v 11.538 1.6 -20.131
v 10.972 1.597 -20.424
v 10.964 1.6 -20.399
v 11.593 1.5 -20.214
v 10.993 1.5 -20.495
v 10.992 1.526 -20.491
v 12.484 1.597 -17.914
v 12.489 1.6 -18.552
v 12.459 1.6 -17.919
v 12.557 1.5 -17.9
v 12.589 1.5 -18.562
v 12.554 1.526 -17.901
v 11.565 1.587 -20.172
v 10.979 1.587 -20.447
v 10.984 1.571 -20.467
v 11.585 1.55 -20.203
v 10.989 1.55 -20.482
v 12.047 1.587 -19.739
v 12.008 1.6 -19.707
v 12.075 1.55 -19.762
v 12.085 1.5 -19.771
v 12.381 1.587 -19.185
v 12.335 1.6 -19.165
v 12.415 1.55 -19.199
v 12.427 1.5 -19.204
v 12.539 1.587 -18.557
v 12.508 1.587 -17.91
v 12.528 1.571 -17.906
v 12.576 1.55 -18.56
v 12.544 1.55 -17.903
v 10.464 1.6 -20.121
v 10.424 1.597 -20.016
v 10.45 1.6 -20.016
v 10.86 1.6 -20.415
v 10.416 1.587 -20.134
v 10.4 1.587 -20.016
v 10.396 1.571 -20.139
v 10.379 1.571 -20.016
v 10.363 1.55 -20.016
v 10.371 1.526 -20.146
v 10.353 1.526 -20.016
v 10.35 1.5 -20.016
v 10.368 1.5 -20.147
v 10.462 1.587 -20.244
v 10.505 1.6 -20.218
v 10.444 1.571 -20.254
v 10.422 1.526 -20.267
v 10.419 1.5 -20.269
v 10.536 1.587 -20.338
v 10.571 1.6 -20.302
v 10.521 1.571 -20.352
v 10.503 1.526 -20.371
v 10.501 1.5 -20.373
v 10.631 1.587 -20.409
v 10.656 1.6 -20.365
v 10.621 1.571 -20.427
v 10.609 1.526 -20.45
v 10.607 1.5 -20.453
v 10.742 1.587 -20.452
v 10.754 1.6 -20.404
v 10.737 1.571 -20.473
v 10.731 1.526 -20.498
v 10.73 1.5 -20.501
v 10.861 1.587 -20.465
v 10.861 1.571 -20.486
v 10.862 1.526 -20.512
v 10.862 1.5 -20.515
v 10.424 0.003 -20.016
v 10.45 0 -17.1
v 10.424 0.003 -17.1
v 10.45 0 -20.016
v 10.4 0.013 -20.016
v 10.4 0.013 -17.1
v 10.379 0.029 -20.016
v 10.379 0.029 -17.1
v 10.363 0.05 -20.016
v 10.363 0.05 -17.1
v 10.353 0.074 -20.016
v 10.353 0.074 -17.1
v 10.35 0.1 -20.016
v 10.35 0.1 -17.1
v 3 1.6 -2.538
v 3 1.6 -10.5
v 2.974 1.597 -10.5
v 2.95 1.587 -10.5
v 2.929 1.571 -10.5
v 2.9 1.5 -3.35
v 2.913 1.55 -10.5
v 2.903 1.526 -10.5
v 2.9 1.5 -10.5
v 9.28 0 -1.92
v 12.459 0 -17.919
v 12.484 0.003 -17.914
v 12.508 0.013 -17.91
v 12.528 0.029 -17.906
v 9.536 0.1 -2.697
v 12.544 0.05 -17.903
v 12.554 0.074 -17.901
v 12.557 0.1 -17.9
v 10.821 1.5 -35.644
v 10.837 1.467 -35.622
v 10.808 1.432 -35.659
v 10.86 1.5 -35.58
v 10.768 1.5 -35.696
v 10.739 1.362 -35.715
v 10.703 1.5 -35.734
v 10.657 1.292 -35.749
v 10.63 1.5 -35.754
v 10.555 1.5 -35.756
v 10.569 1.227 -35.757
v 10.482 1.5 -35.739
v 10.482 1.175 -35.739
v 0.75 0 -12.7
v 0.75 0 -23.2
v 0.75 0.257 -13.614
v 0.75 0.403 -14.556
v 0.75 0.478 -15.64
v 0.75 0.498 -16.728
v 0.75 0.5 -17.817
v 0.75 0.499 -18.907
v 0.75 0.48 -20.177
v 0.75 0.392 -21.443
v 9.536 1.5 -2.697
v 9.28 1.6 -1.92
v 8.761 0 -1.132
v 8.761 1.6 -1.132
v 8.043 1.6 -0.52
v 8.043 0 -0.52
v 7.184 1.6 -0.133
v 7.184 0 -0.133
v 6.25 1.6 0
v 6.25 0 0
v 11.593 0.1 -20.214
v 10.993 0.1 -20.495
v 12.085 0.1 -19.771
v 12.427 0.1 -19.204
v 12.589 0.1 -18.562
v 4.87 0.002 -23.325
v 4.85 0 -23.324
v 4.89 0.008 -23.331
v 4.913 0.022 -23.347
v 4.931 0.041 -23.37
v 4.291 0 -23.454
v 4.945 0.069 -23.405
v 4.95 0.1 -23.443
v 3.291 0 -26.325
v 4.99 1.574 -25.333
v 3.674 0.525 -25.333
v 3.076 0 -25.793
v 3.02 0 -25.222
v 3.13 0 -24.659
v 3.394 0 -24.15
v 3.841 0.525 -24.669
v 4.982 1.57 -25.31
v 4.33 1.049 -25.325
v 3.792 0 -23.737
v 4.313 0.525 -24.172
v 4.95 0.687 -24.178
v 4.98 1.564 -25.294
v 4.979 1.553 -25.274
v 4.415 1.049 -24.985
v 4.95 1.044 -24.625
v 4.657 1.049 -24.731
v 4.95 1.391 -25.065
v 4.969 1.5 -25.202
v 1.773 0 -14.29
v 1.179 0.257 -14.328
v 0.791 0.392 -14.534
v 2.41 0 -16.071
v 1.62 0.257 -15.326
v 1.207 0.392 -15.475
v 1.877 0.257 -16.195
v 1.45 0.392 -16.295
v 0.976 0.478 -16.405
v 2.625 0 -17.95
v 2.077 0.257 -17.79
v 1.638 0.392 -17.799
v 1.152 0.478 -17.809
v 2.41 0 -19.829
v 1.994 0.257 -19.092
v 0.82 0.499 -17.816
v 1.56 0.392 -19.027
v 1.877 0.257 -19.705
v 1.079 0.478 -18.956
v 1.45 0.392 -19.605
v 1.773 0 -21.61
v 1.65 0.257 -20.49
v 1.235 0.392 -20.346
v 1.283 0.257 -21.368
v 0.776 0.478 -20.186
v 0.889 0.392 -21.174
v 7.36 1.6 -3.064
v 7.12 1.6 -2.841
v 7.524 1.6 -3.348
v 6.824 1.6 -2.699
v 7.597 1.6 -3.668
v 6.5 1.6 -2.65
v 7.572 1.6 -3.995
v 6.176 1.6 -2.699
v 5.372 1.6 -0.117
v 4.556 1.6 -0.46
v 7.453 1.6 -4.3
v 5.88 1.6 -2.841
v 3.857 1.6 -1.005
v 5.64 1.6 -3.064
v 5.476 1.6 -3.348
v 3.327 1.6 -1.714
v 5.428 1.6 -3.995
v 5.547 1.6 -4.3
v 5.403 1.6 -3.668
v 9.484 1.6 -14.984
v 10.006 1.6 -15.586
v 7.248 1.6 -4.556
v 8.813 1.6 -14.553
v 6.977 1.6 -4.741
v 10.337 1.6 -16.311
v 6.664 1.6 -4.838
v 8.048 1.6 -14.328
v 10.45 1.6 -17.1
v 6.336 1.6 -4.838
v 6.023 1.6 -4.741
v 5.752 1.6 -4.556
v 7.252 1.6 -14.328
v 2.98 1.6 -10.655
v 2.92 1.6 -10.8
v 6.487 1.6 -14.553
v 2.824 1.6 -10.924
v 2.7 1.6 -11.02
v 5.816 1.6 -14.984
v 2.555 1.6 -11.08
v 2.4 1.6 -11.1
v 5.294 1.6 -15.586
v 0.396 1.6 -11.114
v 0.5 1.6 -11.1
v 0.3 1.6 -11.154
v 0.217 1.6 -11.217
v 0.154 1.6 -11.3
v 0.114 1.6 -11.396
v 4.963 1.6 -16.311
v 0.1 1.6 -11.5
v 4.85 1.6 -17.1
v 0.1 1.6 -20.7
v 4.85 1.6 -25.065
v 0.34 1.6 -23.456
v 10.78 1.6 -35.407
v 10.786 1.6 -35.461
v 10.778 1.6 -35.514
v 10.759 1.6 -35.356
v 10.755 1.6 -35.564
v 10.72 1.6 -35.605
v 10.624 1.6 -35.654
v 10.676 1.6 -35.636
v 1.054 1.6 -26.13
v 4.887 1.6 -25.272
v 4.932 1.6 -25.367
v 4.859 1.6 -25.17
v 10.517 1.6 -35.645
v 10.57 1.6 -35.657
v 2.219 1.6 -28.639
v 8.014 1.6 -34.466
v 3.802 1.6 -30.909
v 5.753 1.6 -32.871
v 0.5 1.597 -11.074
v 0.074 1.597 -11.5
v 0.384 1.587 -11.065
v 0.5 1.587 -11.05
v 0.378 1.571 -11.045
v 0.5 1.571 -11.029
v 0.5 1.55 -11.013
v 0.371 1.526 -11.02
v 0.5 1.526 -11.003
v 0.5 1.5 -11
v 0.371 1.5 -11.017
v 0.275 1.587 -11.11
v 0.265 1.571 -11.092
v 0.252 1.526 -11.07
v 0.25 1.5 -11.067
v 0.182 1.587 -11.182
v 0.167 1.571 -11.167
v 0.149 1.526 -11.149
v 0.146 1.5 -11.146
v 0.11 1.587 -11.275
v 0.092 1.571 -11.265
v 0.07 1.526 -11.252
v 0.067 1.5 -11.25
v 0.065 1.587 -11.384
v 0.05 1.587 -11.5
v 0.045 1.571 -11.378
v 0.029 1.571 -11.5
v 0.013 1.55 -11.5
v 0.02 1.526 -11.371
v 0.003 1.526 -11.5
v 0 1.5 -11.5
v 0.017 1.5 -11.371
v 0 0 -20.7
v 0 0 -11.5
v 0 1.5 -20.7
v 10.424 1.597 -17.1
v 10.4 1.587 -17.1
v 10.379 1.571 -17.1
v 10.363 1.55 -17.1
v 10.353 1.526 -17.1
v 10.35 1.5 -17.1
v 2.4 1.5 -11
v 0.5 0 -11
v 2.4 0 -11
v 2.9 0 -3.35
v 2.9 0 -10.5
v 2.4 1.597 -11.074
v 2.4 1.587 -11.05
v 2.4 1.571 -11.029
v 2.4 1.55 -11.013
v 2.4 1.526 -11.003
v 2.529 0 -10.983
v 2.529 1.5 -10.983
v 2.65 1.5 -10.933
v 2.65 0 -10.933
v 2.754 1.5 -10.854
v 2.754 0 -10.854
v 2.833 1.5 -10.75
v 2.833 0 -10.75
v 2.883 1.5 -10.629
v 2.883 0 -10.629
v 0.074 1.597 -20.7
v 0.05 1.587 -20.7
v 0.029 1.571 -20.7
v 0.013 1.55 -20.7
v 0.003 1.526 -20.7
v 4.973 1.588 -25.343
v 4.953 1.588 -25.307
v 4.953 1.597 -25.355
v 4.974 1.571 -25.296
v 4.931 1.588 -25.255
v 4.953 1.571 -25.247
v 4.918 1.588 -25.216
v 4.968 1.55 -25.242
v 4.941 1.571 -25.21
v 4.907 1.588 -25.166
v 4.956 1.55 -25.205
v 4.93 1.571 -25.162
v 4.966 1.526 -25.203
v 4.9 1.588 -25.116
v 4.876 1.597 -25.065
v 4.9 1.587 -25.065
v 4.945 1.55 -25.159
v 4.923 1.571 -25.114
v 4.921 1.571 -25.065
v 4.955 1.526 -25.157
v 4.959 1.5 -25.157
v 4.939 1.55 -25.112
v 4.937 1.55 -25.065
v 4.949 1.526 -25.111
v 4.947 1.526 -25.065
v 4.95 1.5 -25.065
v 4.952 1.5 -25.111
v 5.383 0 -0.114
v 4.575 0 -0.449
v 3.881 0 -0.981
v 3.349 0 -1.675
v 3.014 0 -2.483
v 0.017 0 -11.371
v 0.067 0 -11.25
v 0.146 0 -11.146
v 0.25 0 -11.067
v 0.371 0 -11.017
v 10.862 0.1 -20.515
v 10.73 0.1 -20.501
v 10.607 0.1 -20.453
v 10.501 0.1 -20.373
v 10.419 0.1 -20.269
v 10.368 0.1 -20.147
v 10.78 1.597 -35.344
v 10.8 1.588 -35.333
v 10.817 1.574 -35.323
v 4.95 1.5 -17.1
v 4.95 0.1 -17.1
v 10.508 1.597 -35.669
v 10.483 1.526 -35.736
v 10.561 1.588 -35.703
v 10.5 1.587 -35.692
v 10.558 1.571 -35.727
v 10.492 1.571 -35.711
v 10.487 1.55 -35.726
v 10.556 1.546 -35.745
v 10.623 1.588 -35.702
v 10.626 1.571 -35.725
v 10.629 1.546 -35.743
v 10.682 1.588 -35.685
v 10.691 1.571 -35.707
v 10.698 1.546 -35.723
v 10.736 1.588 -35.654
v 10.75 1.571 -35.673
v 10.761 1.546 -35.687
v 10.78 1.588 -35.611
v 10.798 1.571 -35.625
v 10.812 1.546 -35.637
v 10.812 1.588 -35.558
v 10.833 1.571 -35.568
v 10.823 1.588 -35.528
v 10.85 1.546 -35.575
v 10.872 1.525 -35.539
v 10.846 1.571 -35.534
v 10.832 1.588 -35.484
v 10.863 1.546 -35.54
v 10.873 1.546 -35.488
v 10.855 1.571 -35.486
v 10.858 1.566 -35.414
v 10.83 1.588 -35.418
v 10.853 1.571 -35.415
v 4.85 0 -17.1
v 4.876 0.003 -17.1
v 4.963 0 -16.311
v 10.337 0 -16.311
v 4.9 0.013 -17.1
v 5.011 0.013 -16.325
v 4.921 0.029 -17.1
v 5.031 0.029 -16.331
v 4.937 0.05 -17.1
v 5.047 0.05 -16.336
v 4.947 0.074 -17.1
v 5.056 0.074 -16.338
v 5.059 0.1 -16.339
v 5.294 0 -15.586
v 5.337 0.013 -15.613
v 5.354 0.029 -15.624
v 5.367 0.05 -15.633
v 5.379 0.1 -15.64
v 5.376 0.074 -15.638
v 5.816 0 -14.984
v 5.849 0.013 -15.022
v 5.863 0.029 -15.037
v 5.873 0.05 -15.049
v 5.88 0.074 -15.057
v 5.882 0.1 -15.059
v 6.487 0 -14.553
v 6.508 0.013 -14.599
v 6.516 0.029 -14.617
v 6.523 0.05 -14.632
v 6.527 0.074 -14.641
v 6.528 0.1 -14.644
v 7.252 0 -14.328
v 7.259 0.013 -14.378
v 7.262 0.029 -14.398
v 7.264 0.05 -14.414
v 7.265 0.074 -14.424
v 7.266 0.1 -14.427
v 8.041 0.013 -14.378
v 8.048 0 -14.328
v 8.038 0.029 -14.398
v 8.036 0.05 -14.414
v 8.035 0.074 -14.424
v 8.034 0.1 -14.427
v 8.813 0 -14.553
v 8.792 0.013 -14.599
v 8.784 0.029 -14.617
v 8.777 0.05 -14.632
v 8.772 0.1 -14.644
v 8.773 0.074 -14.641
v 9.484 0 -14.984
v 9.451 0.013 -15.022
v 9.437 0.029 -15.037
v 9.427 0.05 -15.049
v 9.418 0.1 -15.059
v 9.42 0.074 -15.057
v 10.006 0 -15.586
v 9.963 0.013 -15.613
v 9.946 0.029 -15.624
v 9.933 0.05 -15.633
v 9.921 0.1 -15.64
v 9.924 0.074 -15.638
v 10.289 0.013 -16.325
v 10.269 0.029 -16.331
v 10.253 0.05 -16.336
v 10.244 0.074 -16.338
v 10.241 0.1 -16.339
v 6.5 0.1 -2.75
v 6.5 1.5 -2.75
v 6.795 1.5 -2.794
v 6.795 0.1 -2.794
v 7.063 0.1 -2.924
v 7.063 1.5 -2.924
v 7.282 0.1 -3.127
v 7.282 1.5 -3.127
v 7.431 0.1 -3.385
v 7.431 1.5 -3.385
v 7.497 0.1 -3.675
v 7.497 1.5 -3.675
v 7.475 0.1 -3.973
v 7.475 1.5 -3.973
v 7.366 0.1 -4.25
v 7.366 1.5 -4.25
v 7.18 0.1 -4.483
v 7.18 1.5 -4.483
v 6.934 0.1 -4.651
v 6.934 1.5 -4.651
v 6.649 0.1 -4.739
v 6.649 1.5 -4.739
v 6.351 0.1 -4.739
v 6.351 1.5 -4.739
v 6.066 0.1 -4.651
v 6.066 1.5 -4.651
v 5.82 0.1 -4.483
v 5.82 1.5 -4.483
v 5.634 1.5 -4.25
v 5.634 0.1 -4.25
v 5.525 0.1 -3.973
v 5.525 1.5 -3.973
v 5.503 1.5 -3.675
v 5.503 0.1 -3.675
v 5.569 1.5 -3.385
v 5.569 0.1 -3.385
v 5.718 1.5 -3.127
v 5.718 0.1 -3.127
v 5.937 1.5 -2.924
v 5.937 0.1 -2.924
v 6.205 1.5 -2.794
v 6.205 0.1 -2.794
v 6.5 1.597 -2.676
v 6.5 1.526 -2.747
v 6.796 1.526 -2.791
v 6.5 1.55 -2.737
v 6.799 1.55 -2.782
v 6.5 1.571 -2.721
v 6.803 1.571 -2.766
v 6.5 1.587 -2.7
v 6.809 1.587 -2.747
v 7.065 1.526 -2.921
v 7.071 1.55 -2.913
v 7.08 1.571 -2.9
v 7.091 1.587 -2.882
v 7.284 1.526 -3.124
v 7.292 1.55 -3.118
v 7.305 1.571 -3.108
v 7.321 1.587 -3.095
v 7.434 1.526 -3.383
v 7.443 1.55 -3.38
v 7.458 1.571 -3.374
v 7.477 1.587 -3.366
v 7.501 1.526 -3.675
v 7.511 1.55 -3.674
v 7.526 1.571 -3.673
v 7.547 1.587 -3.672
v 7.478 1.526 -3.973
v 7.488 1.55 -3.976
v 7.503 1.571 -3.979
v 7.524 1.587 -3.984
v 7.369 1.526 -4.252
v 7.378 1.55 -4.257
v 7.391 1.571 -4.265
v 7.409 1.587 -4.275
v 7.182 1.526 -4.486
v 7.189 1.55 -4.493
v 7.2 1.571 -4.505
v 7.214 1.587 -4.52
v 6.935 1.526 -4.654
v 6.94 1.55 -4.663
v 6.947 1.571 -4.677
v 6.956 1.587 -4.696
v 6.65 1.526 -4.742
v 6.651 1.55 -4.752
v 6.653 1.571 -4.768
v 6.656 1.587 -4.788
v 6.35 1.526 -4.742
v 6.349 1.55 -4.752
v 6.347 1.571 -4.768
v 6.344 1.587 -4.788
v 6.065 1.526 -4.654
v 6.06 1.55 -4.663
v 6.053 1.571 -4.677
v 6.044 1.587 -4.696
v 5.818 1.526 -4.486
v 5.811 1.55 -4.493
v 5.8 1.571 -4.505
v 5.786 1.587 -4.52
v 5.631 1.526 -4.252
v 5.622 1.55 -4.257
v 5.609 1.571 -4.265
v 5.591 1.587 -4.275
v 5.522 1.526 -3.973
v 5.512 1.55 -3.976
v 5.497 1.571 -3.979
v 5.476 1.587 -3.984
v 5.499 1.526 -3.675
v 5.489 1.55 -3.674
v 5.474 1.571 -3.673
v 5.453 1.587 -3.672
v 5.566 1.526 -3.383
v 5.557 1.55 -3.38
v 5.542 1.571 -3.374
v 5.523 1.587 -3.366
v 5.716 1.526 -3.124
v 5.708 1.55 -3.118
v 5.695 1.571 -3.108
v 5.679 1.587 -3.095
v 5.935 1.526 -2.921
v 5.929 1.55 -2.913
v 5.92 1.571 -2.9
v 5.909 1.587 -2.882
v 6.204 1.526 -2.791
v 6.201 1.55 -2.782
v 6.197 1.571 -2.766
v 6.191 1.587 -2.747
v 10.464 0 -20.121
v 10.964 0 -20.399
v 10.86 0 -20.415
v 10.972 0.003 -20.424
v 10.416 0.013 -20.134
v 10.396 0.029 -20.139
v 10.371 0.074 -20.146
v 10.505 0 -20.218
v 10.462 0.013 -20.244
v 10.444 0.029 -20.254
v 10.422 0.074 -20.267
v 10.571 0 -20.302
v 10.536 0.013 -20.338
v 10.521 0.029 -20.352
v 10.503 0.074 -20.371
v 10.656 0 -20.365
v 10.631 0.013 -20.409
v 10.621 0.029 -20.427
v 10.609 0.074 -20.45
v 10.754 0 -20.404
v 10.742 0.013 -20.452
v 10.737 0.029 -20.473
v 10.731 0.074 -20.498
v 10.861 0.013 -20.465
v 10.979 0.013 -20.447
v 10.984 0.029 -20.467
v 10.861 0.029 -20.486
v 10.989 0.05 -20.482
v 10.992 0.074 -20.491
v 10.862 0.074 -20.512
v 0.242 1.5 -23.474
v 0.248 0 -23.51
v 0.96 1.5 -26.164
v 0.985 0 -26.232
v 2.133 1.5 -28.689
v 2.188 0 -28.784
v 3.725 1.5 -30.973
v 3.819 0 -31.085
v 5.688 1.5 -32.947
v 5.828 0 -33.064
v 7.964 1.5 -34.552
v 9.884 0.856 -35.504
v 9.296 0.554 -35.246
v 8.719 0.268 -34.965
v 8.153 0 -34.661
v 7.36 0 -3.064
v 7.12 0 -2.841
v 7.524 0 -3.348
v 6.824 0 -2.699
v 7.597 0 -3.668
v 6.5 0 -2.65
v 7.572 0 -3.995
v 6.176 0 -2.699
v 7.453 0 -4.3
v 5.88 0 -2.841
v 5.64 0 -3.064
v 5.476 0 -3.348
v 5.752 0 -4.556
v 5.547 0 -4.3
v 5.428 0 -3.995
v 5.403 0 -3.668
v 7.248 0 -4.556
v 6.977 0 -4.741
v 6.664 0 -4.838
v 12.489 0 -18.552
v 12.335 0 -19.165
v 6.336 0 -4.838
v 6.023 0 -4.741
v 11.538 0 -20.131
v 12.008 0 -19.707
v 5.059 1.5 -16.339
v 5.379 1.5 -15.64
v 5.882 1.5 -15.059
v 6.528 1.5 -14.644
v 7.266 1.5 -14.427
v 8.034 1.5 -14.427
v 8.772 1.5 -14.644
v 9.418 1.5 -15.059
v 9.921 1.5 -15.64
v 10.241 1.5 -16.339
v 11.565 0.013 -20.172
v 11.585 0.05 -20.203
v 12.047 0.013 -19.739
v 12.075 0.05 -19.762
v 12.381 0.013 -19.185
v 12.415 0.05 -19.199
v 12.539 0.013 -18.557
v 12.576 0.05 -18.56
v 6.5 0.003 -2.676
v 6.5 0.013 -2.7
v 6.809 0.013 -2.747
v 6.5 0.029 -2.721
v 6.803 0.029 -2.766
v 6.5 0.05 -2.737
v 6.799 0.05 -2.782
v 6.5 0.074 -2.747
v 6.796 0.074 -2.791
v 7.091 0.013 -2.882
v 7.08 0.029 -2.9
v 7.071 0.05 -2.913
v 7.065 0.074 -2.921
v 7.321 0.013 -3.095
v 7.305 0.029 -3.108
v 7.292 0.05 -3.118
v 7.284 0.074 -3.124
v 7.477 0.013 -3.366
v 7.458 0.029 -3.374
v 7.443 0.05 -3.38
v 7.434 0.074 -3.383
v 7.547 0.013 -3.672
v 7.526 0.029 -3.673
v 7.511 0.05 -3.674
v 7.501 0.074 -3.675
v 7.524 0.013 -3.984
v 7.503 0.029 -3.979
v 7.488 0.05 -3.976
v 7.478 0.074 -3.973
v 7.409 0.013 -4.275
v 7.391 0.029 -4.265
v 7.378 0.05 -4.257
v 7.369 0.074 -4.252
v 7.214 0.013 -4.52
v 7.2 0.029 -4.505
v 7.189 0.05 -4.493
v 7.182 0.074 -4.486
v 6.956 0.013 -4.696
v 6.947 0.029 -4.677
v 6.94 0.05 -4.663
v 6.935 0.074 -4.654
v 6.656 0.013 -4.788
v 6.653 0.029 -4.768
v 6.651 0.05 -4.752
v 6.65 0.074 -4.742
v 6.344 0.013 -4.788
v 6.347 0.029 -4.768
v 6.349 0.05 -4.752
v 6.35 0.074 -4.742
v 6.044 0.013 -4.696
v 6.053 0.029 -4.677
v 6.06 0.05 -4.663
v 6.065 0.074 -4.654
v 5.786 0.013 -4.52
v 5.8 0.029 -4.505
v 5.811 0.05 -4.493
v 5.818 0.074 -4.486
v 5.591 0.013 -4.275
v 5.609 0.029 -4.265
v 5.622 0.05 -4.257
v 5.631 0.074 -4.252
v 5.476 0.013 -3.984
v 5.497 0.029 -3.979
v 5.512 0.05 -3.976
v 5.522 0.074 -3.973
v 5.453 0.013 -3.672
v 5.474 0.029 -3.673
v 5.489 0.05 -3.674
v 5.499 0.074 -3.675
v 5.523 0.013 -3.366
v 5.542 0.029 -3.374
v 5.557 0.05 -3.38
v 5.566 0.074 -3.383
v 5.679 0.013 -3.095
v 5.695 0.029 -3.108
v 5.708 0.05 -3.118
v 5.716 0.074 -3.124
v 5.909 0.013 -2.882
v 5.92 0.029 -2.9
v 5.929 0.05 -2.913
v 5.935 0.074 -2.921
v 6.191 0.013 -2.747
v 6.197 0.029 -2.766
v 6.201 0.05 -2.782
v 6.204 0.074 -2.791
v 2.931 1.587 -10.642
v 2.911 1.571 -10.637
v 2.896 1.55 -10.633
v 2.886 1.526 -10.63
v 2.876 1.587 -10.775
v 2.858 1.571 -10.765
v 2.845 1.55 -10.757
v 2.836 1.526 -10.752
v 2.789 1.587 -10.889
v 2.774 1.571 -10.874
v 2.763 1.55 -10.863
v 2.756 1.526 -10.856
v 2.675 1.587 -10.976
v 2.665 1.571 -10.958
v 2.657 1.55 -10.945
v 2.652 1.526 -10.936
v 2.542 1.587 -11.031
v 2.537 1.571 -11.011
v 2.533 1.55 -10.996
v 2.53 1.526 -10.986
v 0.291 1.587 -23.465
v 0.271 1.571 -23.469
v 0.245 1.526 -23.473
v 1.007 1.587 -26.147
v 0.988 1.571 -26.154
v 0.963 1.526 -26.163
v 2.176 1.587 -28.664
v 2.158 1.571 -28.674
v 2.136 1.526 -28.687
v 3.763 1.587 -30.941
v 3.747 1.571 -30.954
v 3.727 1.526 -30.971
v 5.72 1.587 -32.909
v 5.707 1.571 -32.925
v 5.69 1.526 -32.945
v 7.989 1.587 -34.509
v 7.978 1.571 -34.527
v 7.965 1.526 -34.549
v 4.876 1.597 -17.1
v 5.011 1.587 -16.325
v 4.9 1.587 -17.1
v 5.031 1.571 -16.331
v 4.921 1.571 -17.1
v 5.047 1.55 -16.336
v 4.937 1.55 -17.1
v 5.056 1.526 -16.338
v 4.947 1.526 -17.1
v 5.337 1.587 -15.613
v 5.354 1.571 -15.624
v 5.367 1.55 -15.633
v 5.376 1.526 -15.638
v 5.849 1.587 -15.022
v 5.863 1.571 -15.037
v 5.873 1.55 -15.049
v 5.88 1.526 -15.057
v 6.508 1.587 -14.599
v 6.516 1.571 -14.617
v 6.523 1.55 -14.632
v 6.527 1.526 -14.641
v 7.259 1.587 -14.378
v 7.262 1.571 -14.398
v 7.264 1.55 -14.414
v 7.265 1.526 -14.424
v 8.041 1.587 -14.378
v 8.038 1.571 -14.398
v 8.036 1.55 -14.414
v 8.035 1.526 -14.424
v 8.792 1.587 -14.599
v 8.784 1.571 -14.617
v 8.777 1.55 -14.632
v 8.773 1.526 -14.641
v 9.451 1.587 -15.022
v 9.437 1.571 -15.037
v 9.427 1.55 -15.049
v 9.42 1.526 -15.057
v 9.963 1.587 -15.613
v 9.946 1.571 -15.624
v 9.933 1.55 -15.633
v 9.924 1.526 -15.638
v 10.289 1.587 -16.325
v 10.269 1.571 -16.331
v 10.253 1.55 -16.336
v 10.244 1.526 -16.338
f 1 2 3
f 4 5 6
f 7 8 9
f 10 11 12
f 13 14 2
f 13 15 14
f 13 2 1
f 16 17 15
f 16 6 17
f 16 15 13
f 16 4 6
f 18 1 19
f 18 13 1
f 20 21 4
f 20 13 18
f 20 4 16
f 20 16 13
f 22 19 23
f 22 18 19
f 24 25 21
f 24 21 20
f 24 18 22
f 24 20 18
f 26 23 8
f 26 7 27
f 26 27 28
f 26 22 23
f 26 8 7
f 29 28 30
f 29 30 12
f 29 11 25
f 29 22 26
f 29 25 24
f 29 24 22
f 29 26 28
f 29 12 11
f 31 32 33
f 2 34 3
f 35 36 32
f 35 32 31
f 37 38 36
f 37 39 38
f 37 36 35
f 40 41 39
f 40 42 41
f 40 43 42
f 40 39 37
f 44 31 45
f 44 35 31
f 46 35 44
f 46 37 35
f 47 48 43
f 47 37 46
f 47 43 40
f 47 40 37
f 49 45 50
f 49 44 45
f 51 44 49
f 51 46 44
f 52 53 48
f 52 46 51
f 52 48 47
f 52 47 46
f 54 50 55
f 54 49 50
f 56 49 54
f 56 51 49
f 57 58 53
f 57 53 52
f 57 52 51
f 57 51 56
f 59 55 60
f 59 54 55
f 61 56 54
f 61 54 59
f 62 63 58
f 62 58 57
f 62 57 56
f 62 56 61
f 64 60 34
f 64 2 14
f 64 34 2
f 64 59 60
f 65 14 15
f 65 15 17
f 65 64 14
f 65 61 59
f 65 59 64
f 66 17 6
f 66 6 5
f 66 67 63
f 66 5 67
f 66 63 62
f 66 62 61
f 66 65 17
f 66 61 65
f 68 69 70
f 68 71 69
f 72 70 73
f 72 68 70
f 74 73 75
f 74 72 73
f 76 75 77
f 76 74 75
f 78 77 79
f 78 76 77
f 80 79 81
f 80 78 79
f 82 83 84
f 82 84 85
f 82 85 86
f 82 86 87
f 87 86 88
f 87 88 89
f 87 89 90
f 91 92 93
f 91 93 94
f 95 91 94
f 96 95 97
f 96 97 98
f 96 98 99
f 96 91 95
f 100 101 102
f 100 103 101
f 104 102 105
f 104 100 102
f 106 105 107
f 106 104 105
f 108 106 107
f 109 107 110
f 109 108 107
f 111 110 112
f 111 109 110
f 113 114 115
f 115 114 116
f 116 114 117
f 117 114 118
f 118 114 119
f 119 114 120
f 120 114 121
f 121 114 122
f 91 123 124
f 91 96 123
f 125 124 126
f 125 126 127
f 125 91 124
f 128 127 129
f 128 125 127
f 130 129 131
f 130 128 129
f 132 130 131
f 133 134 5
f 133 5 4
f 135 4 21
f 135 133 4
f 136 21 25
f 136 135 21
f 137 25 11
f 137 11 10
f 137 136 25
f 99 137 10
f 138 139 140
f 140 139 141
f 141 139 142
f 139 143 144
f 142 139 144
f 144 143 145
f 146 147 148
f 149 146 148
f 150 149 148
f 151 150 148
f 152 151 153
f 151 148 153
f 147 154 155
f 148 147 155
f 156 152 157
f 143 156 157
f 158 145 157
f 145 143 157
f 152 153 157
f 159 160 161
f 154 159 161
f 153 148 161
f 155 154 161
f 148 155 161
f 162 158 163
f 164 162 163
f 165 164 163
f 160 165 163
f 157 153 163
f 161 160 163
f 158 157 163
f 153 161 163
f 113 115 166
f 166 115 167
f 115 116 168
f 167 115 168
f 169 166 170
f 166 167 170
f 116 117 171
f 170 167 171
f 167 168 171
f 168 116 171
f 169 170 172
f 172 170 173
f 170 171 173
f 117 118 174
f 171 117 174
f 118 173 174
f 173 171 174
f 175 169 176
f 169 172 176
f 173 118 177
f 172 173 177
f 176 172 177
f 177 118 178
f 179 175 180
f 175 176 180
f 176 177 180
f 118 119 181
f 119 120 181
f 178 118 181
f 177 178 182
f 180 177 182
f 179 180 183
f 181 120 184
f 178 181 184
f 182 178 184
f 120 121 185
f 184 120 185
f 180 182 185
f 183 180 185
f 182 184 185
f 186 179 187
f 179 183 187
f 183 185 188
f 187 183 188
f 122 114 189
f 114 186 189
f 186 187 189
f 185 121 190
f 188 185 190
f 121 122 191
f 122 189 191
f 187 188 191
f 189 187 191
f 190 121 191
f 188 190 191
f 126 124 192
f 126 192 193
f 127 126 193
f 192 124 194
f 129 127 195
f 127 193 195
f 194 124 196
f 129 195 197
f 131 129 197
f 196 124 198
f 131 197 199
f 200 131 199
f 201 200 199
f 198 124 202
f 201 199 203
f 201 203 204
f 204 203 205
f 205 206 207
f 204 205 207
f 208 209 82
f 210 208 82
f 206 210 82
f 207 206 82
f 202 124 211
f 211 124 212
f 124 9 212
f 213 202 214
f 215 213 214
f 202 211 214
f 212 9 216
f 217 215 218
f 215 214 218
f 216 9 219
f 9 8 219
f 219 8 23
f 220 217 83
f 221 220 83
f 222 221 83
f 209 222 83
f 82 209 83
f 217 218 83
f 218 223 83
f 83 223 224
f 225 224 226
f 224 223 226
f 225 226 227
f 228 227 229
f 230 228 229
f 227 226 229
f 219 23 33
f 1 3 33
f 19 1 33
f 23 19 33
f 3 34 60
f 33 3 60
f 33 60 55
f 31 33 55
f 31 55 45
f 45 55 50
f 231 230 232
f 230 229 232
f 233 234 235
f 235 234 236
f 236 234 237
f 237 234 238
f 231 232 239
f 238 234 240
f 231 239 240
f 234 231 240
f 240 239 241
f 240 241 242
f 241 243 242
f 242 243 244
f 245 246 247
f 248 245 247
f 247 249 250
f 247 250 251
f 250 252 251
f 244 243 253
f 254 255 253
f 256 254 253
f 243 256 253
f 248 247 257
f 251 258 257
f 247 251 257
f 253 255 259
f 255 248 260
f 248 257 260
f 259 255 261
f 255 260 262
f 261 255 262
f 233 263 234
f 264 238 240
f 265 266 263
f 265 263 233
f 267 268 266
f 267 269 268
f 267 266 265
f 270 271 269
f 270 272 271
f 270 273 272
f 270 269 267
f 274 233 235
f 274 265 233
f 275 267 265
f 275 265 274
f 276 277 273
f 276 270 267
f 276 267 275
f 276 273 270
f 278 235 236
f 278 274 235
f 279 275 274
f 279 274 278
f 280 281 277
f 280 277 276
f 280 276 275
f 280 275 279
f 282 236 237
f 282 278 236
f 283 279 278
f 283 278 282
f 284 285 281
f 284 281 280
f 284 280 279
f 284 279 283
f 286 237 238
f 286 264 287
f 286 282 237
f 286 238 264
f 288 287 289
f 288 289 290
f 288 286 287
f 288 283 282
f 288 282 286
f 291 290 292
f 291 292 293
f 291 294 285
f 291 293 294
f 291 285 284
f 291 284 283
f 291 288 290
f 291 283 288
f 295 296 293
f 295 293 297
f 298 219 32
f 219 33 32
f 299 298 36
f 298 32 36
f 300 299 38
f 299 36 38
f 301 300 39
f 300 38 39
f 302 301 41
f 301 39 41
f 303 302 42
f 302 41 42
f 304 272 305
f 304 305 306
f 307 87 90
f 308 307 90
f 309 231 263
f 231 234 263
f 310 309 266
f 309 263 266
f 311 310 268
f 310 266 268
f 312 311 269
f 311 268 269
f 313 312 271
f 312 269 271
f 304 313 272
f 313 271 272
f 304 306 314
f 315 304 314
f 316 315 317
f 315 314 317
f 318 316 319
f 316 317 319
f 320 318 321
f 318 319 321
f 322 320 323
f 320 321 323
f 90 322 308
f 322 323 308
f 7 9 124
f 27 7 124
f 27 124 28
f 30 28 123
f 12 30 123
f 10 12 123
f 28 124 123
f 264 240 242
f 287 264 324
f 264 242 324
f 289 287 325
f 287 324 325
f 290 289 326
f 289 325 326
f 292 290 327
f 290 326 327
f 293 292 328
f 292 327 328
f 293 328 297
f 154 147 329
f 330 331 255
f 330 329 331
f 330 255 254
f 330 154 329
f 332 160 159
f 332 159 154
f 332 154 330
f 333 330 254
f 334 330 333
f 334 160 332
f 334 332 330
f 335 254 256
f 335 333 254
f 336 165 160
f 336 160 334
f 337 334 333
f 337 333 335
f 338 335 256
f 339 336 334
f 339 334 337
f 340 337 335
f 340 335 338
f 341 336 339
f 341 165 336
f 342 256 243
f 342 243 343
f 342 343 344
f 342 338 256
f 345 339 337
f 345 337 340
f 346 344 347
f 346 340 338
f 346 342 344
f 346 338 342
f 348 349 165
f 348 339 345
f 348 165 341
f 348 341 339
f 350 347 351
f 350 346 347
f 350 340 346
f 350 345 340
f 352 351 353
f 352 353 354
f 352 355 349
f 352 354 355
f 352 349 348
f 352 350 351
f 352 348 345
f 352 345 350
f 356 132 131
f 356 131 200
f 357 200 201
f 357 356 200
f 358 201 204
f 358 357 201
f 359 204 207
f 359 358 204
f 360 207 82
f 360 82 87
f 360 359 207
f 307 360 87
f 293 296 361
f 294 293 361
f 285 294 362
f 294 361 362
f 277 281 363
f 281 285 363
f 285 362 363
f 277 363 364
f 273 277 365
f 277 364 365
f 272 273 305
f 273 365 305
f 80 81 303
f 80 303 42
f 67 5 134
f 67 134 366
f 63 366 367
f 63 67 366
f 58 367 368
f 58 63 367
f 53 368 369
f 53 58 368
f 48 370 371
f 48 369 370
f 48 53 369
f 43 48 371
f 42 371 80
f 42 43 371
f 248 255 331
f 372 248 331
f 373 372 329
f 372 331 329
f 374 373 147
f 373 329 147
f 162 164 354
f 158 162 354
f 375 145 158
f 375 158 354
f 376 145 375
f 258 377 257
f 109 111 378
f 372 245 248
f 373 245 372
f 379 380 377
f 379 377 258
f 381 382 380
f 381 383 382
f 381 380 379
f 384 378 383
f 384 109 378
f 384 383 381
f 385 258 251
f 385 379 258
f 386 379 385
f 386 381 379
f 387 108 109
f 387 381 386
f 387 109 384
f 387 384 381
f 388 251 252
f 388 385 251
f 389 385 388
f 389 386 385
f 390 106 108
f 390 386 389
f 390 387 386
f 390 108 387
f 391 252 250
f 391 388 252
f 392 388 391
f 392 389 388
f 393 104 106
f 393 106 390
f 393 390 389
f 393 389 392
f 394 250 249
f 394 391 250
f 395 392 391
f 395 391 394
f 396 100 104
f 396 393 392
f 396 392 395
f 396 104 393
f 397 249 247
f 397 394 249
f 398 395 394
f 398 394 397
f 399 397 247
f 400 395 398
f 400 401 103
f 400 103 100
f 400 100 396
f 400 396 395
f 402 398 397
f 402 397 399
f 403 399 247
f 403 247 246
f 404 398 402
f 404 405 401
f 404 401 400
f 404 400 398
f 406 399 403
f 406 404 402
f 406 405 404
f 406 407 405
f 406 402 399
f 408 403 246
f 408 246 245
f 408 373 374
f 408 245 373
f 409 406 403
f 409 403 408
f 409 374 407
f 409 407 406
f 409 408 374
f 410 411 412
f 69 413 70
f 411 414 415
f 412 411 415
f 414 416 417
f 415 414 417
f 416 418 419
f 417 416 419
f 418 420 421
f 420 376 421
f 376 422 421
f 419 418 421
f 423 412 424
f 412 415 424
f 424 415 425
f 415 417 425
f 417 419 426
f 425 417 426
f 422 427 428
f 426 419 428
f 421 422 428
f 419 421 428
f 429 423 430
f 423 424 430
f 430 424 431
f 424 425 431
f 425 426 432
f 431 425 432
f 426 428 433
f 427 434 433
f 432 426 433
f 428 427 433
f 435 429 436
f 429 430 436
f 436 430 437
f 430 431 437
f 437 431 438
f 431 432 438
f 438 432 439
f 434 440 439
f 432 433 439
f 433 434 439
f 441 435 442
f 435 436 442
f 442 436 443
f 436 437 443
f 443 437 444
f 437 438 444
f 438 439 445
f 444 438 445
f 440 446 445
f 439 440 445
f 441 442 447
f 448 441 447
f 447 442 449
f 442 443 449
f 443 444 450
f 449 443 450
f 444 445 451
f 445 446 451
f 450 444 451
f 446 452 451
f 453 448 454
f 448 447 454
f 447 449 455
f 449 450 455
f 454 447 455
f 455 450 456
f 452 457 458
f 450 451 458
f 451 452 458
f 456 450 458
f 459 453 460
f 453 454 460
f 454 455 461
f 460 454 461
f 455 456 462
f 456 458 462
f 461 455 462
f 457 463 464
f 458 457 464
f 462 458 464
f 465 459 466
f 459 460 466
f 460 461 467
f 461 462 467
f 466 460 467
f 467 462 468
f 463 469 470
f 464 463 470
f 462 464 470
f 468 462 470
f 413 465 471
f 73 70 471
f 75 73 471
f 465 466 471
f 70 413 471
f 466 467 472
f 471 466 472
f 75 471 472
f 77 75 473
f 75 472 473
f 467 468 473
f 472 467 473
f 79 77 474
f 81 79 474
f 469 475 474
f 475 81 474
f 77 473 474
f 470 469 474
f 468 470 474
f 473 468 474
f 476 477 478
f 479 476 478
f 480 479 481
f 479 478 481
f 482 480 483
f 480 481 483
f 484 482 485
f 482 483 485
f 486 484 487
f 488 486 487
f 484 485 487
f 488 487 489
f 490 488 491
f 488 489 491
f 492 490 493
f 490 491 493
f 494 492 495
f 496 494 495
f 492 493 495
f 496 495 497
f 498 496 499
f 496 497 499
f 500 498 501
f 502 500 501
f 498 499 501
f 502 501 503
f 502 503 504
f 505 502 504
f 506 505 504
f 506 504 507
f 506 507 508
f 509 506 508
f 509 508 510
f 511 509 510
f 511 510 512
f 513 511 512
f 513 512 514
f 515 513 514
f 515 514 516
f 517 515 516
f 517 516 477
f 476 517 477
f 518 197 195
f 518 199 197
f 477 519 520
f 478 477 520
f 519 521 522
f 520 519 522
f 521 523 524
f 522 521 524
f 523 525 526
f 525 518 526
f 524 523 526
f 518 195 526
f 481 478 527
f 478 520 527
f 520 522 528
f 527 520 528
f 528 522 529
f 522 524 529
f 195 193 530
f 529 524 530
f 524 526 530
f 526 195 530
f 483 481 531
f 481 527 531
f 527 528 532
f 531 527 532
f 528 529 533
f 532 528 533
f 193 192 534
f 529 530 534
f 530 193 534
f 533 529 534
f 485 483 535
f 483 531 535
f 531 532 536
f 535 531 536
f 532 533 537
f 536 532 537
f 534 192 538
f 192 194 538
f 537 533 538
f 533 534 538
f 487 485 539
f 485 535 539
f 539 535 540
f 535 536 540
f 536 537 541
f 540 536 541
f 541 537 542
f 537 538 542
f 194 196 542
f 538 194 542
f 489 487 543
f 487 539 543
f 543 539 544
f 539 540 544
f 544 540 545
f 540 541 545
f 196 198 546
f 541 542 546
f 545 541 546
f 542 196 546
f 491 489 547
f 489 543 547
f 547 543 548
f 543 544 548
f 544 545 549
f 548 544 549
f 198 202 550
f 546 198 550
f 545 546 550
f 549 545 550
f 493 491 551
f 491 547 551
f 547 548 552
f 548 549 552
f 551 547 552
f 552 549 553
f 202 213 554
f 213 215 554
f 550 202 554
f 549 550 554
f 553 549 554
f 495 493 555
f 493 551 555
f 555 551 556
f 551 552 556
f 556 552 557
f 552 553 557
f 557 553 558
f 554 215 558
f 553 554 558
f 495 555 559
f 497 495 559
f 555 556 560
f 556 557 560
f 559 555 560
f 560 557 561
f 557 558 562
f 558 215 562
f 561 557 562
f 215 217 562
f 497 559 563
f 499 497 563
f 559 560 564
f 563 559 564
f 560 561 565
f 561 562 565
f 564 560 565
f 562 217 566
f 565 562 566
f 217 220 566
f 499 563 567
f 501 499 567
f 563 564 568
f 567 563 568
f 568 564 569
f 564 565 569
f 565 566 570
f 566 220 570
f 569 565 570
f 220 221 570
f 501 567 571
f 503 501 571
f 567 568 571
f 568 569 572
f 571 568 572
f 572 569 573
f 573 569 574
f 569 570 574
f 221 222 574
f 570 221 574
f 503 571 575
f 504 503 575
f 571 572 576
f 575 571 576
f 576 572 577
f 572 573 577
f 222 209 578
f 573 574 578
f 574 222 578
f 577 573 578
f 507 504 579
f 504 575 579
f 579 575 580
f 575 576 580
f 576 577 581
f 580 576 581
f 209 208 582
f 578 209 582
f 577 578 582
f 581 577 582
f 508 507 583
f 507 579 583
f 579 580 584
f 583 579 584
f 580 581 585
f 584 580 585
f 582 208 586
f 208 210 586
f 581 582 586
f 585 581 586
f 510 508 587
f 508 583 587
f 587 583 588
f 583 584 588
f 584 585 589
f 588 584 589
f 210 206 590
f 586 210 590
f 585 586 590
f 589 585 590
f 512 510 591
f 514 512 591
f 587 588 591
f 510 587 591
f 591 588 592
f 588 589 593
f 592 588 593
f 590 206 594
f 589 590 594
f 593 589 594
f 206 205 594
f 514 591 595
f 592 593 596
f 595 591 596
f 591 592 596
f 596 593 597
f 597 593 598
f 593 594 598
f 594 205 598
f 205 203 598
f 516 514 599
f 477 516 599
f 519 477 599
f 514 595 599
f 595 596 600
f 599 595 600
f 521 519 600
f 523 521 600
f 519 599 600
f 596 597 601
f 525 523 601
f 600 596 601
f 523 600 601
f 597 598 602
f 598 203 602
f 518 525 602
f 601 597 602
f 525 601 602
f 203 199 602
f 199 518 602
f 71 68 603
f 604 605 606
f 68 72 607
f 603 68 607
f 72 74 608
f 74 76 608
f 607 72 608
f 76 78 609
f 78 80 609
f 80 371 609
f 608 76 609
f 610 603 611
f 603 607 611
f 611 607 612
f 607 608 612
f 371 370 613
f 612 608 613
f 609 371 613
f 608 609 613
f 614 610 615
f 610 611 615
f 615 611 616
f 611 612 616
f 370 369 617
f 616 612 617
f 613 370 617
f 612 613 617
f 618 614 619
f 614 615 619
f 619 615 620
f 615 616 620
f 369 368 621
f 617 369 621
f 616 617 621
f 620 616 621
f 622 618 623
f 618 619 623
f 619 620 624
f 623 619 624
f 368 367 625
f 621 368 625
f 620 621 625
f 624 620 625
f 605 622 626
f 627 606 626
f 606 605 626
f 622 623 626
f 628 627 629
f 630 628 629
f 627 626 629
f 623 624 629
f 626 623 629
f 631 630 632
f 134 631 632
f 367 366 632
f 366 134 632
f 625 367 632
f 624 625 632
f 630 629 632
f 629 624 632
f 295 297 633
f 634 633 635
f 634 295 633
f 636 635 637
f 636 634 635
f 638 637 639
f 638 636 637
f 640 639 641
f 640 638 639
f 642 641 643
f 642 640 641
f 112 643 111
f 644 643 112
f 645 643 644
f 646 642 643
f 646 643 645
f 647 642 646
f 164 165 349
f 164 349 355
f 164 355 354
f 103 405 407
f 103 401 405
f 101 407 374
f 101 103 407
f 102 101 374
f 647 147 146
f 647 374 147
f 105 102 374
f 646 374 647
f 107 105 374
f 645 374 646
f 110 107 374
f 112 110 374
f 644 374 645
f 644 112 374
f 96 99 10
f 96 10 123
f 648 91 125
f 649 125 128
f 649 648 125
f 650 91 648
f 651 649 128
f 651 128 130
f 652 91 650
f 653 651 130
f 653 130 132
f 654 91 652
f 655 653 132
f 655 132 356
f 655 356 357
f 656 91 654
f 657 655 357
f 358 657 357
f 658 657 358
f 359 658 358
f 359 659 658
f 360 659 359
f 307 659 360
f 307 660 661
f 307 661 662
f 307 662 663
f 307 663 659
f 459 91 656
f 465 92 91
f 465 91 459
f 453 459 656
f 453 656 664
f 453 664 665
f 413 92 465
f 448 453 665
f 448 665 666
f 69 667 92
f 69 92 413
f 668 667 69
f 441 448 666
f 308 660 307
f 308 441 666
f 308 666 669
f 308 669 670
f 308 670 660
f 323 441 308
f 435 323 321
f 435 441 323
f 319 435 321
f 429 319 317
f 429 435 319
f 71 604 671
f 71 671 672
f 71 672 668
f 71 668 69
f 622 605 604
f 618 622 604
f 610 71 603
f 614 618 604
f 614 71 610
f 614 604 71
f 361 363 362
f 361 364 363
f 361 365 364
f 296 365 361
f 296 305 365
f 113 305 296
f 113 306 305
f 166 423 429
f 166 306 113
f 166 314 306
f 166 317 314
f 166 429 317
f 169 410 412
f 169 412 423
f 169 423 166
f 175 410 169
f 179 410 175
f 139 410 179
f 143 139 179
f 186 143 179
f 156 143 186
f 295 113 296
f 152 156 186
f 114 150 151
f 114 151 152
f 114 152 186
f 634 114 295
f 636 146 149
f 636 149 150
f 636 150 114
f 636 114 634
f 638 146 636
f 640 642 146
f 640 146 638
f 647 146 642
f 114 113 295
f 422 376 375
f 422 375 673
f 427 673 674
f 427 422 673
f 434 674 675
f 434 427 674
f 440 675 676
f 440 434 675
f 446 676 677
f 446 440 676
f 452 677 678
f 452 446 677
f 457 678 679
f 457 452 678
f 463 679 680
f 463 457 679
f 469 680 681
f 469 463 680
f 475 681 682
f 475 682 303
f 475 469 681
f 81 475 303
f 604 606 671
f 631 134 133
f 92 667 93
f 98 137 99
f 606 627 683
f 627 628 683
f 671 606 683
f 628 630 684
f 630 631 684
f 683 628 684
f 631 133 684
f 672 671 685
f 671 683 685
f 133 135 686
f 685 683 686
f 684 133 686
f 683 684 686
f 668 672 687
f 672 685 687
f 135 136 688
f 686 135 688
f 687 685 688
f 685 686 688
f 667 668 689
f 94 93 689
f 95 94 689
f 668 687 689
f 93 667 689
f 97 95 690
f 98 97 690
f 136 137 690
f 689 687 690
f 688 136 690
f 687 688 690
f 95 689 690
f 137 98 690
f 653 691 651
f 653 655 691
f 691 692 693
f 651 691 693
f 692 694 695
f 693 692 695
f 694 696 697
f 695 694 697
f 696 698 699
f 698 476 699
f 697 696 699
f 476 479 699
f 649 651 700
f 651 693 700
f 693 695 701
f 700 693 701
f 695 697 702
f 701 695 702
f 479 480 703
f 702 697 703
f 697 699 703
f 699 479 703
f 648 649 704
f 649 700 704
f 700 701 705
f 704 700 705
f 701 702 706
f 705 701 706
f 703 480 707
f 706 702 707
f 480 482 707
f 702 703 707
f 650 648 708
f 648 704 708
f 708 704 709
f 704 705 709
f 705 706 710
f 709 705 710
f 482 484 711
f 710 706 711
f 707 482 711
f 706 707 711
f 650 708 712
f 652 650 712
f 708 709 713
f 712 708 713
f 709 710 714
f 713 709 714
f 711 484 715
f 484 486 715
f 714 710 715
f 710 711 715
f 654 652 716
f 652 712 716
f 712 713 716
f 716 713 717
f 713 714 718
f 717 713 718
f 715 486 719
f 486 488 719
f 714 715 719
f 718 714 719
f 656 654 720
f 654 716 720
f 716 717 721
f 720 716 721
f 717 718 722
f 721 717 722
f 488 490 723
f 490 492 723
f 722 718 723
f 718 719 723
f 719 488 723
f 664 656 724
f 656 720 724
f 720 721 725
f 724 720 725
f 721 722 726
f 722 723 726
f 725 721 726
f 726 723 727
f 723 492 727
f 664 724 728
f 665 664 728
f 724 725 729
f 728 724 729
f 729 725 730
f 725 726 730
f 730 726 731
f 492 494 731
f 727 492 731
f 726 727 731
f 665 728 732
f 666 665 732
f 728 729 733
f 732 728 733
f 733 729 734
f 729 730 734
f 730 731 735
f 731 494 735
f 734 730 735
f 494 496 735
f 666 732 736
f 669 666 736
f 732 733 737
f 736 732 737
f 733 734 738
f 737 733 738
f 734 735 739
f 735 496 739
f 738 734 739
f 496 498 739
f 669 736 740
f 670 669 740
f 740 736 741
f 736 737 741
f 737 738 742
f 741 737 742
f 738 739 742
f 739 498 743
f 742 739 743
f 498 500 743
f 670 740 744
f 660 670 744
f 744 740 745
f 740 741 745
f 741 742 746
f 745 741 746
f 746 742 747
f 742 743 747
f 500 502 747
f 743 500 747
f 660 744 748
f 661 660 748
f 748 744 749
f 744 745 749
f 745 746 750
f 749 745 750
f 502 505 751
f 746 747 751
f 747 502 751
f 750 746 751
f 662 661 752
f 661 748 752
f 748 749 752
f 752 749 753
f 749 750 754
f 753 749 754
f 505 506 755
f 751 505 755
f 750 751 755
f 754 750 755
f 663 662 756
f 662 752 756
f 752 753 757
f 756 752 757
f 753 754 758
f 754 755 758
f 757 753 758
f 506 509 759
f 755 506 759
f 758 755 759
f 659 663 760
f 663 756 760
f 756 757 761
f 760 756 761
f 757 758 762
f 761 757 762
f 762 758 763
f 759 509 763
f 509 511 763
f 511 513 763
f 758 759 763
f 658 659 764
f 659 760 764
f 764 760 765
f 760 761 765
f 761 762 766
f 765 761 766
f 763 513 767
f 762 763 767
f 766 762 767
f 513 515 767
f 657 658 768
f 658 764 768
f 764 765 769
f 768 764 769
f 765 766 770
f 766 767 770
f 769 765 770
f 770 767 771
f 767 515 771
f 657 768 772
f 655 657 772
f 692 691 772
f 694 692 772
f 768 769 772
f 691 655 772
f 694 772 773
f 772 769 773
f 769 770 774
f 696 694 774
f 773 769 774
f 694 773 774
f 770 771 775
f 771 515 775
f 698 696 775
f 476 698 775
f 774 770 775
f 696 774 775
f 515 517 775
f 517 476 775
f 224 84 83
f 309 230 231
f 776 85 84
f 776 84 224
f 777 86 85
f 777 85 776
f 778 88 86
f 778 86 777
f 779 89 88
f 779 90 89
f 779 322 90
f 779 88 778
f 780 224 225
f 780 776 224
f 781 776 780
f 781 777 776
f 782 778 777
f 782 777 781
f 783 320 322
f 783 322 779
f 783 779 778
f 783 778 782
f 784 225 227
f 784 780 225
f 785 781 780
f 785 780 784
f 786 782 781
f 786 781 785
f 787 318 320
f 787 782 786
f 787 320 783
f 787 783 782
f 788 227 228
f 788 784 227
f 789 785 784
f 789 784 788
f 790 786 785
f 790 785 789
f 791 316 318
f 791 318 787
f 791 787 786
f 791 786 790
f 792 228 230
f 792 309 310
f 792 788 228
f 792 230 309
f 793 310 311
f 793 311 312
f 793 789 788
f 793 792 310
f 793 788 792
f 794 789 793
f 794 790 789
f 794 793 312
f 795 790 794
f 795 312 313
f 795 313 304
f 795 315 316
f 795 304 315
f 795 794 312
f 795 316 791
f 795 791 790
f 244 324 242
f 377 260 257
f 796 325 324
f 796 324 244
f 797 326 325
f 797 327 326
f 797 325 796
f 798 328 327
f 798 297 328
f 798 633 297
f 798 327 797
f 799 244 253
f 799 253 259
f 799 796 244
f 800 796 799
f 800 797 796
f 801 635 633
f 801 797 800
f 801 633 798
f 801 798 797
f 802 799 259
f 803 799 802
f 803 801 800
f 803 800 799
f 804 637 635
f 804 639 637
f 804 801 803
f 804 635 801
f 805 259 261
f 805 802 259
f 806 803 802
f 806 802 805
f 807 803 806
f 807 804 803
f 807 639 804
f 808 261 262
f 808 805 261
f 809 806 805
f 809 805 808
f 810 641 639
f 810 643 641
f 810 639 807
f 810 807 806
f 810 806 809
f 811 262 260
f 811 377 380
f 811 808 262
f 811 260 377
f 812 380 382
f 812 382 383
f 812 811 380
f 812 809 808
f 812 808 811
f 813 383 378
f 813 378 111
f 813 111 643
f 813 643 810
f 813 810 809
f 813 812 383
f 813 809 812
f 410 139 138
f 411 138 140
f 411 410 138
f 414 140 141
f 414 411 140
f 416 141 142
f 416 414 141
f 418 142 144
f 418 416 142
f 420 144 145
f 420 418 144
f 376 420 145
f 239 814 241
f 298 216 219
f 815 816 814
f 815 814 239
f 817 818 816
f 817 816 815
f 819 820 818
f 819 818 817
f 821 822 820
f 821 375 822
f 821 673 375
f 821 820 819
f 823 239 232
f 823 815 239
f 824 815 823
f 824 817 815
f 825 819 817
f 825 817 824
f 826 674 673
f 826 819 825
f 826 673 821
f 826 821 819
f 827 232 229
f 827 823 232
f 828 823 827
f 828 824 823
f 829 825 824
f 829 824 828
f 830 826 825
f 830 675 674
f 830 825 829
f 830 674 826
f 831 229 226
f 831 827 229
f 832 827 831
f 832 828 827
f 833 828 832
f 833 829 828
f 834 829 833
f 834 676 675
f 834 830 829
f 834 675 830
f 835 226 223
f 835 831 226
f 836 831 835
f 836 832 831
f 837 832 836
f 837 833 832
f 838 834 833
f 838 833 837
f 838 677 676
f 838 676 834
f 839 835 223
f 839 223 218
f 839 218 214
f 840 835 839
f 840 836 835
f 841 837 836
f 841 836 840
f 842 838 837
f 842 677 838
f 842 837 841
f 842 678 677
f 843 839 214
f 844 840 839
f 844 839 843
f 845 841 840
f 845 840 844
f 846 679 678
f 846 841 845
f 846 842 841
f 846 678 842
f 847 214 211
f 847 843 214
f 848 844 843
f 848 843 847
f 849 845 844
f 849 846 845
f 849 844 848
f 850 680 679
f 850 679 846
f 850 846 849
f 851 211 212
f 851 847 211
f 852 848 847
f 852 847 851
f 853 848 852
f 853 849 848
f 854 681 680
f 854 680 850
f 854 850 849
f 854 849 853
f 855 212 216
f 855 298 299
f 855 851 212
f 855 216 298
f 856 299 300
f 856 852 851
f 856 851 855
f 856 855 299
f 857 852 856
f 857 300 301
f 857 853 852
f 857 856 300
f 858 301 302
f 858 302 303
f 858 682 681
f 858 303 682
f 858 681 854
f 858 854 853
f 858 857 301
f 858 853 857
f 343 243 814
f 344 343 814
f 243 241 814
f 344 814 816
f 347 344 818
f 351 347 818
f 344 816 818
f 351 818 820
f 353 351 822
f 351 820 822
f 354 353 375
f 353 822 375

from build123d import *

# Parameters (mm, degrees)
BOSS_EXTRUDE1_DEPTH = 1.6
SKETCH2_R           = 1.0000000000000044
SKETCH2_W           = 2.9000000000000004
SKETCH2_H           = 11
CUT_EXTRUDE1_DEPTH  = 39.174860837991275
FILLET1_R           = 0.5
FILLET10_R          = 0.3
FILLET9_R           = 0.1
CUT_EXTRUDE2_DEPTH  = 15.000001
CUT_REVOLVE1_ANGLE  = 118.304837
FILLET6_R           = 0.1
FILLET14_DEPTH      = 3
CUT_EXTRUDE3_DEPTH  = 0.5
FILLET15_R          = 3.8


with BuildPart() as part:
    # Sketch1 → Boss-Extrude1 (new body)
    with BuildSketch(Plane(origin=(0, 0, 0), x_dir=(1, 0, 0), z_dir=(0, 1, 0))):
        with BuildLine():
            Line((11.249999999999995, 36), (4.949999999999998, 25.199999999999996))
            Line((4.949999999999998, 25.199999999999996), (4.95, 17.099999999999998))
            ThreePointArc((4.95, 17.099999999999998), (7.6499999999999995, 14.399999999999999), (10.350000000000003, 17.099999999999998))
            Line((10.350000000000003, 17.099999999999998), (10.35, 20.588517047756877))
            ThreePointArc((10.35, 20.588517047756877), (12.089132450024001, 19.766073814149554), (12.556853597053188, 17.9))
            Line((12.556853597053188, 17.9), (9, 0))
            Line((9, 0), (0, 0))
            Line((0, 0), (0, 20.699999999999996))
            ThreePointArc((0, 20.699999999999996), (3.1152199182423743, 30.195426530704133), (11.249999999999995, 36))
        make_face()
    extrude(amount=BOSS_EXTRUDE1_DEPTH)

    # Sketch2 → Cut-Extrude1 (cut, through all)
    with BuildSketch(Plane(origin=(0, 1.6, 0), x_dir=(1, 0, 0), z_dir=(0, 1, 0))):
        with Locations(Location((6.5, 3.75, 0), (0, 0, 270))):
            Circle(SKETCH2_R)
        with Locations((1.4500000000000002, 5.5)):
            Rectangle(SKETCH2_W, SKETCH2_H)
    extrude(amount=-CUT_EXTRUDE1_DEPTH, mode=Mode.SUBTRACT)

    # Fillet1
    fillet1_edges = [part.edges().sort_by_distance(p)[0] for p in [
        (4.949999999999998, 0.8, -25.199999999999996),
        (10.35, 0.8, -20.588517047756877),
        (0, 0.8, -11),
        (2.9, 0.8, -11),
    ]]
    fillet(fillet1_edges, radius=FILLET1_R)

    # Fillet10
    fillet10_edges = [part.edges().sort_by_distance(p)[0] for p in [
        (11.249999999999995, 0.8, -36),
    ]]
    fillet(fillet10_edges, radius=FILLET10_R)

    # Fillet9
    fillet9_edges = [part.edges().sort_by_distance(p)[0] for p in [
        (10.778426798526594, 1.6, -8.95),
        (12.27700878864588, 1.6, -19.500040671486303),
        (7.650000000000002, 1.6, -14.4),
        (4.949999999999999, 1.6, -21.082412714662503),
        (2.9, 1.6, -5.25),
        (0, 1.6, -16.099999999999998),
        (1.45, 1.6, -11),
        (10.350000000000001, 1.6, -18.55778401544086),
        (7.931660533666676, 1.6, -30.311418057714306),
        (10.551192847666401, 1.6, -20.416459893750357),
        (0.1464466094067261, 1.6, -11.146446609406727),
        (2.7535533905932734, 1.6, -10.853553390593273),
        (4.967327893272973, 1.6, -25.195315418932243),
        (2.8791430216859144, 1.6, -29.865702507166827),
        (10.8159085390423, 1.6, -35.6500508828696),
    ]]
    fillet(fillet9_edges, radius=FILLET9_R)

    # Sketch4 → Cut-Extrude2 (cut)
    with BuildSketch(Plane(origin=(12.57617593241207, 1.6, -38.27344445556355), x_dir=(-0.8637789008984336, 0, -0.503871025524086), z_dir=(0.503871025524086, 0, -0.8637789008984336))):
        Polygon((0, 0), (2.0000000000000004, -1.6), (-0.3356716848088581, -1.6), (-0.3356716848088581, 0), align=None)
    extrude(amount=-CUT_EXTRUDE2_DEPTH, mode=Mode.SUBTRACT)

    # Cut-Revolve1: read off the stored shape, not the designer's step
    # Cut-Revolve1 outline → Cut-Revolve1 (revolve, cut)
    with BuildSketch(Plane(origin=(5.01811055, 0, -25.316760942), x_dir=(-0.8637788973054713, 0, -0.5038710316834497), z_dir=(0.5038710316834497, 0, -0.8637788973054713))):
        Polygon((0, 0), (2, 0), (0.032626635, 1.573898692), (0, 1.573898692), align=None)
    revolve(axis=Axis((5.01811055, 0, -25.316760942), (0, 0.9999999999999999, 0)), revolution_arc=CUT_REVOLVE1_ANGLE, mode=Mode.SUBTRACT)

    # Fillet6
    fillet6_edges = [part.edges().sort_by_distance(p)[0] for p in [
        (12.27700878864588, 0, -19.500040671486303),
        (10.778426798526594, 0, -8.95),
        (6.5, 0, -4.750000000000004),
        (6.5, 1.6, -4.750000000000004),
        (10.350000000000001, 0, -18.55778401544086),
        (10.551192847666401, 0, -20.416459893750357),
        (4.949999999999999, 0, -20.20896051992093),
        (7.650000000000002, 0, -14.4),
    ]]
    fillet(fillet6_edges, radius=FILLET6_R)

    # Fillet14: read off the stored shape, not the designer's step
    # Fillet14 outline → Fillet14 (cut)
    with BuildSketch(Plane(origin=(0, 0, 0), x_dir=(1, 0, 0), z_dir=(0, 1, 0))):
        with BuildLine():
            ThreePointArc((9.535946874, 2.697172876), (8.375627771, 0.760646462), (6.250094443, 0))
            Line((6.250094443, 0), (9, 0))
            Line((9, 0), (9.535946874, 2.697172876))
        make_face()
        with BuildLine():
            ThreePointArc((6.250094443, 0), (3.881219944, 0.981219945), (2.9, 3.350094443))
            Line((2.9, 3.350094443), (2.9, 0))
            Line((2.9, 0), (6.250094443, 0))
        make_face()
    extrude(amount=FILLET14_DEPTH, mode=Mode.SUBTRACT)

    # Sketch6 → Cut-Extrude3 (cut)
    with BuildSketch(Plane.XZ):
        with BuildLine():
            Line((0.75, -23.199999999999992), (0.75, -12.69999999999999))
            ThreePointArc((0.75, -12.69999999999999), (2.6254751789798503, -17.949999999999992), (0.75, -23.199999999999992))
        make_face()
    extrude(amount=-CUT_EXTRUDE3_DEPTH, mode=Mode.SUBTRACT)

    # Fillet15
    # the kernel refuses this fillet: 3.8 mm, written as the material it adds along each edge
    with BuildSketch(Plane(origin=(-5.660400180851672, 0.5, -17.949999999999992), x_dir=(0.31070324909360797, 0, 0.9505069652573175), z_dir=(-0.9505069652573175, 0, 0.31070324909360797))) as fillet15_piece_1_section:
        with BuildLine():
            CenterArc((6.401730991689845, -3.8), FILLET15_R, 60.27567085289292, 29.724329147107078)
            Line((6.401730991689845, 0), (6.401730991689845, 0.07599999999999994))
            Line((6.401730991689845, 0.07599999999999994), (8.285875359831522, 0.07599999999999994))
            Line((8.285875359831522, 0.07599999999999994), (8.361875359831522, 0))
            ThreePointArc((8.361875359831522, 0), (8.361875359831522, -0.24999999999999997), (8.323558247194356, -0.434))
            Line((8.323558247194356, -0.434), (8.285875359831522, -0.49999999999999994))
        make_face()
    fillet15_piece_1 = revolve(axis=Axis((-5.660400180851672, 0.5, -17.949999999999992), (0, 1, 0)), revolution_arc=143.79676670450274, mode=Mode.PRIVATE)
    fillet15_piece_1 = split(fillet15_piece_1, bisect_by=Plane(origin=(0.75, 0.5, -17.949999999999992), z_dir=(1, 0, 0)), keep=Keep.TOP, mode=Mode.PRIVATE)
    add(fillet15_piece_1)


solid = part.part
